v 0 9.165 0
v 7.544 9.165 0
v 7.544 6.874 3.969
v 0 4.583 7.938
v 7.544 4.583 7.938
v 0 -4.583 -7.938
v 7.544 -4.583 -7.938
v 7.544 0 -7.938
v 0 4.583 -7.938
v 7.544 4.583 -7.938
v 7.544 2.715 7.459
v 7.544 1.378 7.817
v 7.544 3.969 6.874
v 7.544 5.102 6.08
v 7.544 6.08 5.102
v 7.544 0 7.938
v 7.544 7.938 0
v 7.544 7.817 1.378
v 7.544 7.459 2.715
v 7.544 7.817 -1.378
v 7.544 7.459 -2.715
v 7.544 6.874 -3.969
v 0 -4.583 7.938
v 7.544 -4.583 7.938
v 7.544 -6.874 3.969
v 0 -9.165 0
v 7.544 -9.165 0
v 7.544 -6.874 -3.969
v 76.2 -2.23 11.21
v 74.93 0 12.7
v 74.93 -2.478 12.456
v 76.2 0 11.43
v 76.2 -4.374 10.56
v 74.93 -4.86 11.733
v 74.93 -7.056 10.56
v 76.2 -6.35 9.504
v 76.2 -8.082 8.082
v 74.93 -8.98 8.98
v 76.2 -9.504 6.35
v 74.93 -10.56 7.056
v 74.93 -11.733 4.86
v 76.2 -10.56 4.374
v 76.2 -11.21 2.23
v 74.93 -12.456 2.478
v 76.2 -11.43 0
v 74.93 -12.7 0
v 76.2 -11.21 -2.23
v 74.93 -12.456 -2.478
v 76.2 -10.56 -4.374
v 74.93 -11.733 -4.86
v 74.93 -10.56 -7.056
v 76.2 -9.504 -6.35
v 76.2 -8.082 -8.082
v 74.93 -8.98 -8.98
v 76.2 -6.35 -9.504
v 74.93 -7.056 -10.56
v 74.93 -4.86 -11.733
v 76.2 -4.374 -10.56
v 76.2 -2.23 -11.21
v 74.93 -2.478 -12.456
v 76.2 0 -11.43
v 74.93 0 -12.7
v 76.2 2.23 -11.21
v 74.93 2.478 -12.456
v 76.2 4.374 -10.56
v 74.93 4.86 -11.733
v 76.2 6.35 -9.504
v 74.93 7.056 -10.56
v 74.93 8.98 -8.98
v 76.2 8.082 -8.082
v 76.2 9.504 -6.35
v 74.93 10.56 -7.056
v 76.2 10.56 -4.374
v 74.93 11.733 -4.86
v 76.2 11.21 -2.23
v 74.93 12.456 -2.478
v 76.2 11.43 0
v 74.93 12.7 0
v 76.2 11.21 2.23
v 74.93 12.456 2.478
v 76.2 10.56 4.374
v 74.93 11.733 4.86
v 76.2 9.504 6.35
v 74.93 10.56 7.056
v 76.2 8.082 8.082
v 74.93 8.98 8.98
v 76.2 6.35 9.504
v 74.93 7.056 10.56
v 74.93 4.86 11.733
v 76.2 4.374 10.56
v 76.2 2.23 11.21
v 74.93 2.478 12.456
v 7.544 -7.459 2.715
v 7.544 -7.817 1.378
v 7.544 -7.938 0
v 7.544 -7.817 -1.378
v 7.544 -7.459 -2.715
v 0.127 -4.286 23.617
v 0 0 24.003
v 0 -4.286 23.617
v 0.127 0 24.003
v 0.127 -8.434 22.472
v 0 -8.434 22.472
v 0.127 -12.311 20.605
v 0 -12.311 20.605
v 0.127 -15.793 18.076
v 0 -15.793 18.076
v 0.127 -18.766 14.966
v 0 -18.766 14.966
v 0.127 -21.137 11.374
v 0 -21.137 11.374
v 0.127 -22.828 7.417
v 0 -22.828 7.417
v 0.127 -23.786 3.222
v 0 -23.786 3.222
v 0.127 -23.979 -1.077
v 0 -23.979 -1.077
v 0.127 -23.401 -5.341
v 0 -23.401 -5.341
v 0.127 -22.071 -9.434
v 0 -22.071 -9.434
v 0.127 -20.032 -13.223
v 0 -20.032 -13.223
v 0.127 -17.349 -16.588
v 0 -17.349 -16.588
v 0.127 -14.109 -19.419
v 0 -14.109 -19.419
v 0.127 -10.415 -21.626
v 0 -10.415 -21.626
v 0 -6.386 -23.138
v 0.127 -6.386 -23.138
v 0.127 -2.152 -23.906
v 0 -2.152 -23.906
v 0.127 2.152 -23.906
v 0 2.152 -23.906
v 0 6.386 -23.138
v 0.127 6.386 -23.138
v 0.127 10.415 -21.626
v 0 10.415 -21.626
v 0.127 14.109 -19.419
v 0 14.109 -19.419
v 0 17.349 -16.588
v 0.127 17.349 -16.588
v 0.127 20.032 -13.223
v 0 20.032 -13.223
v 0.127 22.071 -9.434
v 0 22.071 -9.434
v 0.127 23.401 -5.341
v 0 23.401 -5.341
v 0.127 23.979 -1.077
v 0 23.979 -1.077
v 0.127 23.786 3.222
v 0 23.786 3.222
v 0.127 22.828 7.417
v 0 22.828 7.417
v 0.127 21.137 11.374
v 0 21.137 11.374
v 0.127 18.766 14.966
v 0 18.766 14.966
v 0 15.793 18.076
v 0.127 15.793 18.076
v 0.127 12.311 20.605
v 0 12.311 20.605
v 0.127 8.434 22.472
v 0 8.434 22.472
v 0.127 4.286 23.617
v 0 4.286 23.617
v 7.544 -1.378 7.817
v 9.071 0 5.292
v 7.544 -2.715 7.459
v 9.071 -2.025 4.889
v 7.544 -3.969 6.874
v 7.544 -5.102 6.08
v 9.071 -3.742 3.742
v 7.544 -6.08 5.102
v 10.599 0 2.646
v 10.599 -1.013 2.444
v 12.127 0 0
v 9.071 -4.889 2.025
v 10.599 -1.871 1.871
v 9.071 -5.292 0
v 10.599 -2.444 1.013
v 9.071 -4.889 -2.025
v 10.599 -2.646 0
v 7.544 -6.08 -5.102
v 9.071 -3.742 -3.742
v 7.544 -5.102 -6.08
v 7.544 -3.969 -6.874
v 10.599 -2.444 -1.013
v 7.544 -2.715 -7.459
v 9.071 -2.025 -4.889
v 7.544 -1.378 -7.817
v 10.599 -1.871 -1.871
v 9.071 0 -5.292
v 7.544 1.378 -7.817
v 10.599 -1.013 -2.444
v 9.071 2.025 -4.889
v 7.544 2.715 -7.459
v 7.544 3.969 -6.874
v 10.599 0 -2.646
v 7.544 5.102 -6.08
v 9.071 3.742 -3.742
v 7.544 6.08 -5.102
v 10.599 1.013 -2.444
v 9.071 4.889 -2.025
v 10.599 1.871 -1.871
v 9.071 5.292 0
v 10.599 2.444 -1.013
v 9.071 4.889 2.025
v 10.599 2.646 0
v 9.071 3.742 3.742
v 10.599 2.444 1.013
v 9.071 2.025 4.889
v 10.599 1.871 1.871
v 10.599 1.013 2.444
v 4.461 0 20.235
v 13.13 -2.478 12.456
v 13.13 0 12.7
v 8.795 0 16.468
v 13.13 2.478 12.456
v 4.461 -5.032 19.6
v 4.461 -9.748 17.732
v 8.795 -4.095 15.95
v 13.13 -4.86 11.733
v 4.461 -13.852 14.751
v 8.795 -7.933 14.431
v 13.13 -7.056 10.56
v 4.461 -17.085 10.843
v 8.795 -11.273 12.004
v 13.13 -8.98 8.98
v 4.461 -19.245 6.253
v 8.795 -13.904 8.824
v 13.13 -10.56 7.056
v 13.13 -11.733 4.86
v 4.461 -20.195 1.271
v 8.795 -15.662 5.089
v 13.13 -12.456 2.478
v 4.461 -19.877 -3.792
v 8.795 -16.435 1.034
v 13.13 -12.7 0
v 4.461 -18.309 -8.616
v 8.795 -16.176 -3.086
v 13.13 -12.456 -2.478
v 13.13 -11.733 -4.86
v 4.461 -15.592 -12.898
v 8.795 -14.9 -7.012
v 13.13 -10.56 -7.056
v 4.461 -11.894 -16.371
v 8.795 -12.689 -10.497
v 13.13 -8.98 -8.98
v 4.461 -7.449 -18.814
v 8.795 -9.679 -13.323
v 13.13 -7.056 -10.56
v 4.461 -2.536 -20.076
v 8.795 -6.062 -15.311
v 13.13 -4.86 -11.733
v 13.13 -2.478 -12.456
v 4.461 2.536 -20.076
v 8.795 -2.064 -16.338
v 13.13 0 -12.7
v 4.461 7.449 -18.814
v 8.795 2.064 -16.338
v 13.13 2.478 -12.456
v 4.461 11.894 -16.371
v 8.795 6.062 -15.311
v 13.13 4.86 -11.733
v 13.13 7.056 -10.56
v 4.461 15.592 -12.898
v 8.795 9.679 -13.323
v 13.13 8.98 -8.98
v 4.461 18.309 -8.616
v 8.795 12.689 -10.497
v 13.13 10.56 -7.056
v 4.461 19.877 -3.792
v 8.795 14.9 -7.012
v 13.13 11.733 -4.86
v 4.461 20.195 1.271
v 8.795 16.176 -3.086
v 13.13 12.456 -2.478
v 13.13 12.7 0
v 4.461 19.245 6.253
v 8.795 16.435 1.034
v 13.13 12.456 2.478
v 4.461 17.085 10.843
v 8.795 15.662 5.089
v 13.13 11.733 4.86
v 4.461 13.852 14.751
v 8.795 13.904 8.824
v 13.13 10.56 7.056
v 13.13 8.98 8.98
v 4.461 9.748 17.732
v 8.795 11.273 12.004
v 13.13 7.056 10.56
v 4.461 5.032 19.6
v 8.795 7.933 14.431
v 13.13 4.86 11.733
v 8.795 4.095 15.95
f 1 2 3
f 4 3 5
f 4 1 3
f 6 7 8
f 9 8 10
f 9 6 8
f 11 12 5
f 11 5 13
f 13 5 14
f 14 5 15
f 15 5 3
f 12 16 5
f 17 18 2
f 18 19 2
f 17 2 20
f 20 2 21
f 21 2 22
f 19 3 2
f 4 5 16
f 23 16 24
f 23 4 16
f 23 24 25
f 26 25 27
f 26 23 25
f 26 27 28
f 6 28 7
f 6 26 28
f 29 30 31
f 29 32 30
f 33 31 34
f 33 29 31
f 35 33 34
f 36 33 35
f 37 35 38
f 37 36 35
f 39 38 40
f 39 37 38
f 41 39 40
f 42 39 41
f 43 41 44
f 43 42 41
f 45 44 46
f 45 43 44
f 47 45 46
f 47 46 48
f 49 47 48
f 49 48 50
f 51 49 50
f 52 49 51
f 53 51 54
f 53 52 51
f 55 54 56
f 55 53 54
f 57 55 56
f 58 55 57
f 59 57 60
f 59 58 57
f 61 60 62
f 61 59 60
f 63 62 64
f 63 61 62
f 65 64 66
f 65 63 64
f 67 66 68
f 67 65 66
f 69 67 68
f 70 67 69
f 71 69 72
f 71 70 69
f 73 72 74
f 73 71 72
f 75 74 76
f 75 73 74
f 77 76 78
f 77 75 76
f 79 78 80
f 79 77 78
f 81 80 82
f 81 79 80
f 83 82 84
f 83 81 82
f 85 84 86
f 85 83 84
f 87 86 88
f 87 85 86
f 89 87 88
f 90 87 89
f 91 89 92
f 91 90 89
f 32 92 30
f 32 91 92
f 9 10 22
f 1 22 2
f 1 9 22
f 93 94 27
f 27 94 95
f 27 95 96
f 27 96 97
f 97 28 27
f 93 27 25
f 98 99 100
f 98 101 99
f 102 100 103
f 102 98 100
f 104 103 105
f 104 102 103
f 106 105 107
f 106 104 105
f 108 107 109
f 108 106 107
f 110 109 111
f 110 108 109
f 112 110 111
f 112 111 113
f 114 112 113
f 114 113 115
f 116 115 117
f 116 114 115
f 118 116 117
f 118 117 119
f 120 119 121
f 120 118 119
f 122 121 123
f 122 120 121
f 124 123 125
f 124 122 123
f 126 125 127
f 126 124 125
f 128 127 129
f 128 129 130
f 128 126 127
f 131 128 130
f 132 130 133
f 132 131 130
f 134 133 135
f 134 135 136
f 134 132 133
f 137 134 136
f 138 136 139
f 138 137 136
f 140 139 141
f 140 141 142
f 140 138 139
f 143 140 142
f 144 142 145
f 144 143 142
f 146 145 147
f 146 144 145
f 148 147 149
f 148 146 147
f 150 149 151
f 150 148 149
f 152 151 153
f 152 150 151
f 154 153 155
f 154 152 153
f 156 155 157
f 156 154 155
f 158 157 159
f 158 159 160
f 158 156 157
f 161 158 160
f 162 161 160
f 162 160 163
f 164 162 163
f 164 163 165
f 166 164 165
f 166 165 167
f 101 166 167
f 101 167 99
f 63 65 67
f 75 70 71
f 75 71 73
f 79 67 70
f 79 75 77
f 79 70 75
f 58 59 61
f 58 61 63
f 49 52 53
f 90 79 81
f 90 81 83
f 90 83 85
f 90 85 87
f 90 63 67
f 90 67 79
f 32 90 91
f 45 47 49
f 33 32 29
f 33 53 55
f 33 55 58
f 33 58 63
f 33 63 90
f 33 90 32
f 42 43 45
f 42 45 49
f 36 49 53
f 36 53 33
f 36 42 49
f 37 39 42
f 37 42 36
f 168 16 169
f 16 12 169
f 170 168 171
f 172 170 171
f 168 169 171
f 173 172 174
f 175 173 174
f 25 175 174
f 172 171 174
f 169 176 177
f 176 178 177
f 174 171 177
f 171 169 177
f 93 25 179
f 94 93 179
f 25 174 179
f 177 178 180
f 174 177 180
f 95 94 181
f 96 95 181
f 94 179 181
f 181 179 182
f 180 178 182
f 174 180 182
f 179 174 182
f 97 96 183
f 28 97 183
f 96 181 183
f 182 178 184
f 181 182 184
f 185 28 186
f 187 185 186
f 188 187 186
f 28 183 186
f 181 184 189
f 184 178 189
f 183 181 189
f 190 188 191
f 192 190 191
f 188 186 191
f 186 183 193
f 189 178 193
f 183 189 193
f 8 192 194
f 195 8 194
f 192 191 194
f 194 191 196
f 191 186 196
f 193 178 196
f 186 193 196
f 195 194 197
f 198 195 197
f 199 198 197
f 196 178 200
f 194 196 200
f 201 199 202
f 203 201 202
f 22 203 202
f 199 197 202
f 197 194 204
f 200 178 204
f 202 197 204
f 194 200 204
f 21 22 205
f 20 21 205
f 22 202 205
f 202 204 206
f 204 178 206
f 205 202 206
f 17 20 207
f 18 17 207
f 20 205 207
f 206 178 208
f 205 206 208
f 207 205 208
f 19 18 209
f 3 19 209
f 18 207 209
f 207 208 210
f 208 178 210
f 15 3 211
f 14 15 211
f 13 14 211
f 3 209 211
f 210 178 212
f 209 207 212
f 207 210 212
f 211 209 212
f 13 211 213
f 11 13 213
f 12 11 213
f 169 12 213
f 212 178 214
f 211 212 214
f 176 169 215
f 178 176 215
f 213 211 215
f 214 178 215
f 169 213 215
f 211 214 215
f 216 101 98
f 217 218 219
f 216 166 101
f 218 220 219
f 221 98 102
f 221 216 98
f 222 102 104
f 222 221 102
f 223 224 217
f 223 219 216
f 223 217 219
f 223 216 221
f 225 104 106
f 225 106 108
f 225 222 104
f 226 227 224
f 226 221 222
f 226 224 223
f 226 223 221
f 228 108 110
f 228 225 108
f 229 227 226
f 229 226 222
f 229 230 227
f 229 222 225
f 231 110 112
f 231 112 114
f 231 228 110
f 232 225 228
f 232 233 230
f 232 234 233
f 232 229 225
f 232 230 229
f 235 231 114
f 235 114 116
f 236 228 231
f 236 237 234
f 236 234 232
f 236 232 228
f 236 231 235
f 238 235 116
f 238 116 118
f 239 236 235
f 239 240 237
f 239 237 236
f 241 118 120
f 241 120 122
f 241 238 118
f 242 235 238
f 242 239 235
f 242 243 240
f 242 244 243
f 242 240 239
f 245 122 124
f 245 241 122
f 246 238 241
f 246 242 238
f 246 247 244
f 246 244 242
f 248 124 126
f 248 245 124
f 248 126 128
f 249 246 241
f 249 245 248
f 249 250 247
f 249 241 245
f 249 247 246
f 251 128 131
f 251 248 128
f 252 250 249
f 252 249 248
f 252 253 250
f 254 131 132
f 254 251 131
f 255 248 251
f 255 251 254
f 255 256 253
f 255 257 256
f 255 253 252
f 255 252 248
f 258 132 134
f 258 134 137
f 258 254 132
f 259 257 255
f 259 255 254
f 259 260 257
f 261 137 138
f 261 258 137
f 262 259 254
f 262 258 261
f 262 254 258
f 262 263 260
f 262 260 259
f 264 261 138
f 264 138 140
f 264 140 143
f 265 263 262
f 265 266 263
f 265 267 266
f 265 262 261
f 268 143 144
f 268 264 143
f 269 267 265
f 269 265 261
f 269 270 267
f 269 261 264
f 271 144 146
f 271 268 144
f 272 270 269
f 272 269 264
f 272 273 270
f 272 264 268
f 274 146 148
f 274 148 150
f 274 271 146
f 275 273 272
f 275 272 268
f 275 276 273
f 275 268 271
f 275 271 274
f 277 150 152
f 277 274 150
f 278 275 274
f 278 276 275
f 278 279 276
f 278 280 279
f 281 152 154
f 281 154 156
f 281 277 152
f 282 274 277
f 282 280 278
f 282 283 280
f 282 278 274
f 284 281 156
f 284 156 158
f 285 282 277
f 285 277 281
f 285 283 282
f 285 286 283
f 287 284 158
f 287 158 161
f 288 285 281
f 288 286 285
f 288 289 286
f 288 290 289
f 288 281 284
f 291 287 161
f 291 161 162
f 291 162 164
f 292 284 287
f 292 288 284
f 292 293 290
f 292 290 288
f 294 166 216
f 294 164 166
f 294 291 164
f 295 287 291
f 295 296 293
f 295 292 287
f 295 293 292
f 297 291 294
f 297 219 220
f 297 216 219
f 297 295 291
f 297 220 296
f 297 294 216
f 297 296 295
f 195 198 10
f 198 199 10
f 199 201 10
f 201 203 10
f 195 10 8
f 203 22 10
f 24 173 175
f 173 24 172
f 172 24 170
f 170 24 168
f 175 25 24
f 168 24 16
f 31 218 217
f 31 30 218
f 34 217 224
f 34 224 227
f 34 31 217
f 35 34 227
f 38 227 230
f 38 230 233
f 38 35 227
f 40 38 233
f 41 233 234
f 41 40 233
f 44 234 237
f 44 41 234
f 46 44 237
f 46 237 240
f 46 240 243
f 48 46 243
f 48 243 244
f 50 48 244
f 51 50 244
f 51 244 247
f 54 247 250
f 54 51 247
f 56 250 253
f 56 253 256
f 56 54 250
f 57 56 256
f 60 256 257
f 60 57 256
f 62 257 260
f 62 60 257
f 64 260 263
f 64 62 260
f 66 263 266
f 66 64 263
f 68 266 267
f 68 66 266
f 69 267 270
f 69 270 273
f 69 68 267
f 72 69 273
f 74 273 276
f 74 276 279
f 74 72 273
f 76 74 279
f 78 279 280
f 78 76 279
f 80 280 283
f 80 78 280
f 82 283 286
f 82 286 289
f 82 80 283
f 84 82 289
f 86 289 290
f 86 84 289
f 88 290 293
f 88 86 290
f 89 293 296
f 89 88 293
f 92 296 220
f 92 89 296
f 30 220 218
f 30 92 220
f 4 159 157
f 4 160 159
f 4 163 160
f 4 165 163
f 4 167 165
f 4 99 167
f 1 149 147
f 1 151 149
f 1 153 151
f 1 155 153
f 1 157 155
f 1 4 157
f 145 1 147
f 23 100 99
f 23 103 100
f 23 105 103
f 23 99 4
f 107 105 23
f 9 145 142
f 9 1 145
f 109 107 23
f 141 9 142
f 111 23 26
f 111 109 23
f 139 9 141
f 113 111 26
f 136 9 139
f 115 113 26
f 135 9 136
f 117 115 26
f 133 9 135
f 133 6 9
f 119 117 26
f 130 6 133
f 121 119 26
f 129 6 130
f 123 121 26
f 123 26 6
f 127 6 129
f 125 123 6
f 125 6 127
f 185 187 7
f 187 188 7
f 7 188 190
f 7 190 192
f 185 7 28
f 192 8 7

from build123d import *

# Parameters (mm, degrees)
HEX_2_DEPTH = 7.5438


with BuildPart() as part:
    # BodySke → BaseBody (revolve)
    with BuildSketch(Plane.XY, mode=Mode.PRIVATE) as basebody_sk:
        Polygon((0, 0), (0, 24.003), (0.127, 24.003), (13.129614107, 12.7), (74.93, 12.7), (76.2, 11.43), (76.2, 0), align=None)
    revolve(basebody_sk.sketch.rotate(Axis((0, 0, 0), (1, 0, 0)), 90), axis=Axis((0, 0, 0), (1, 0, 0)))  # turned: the seam where the file's is

    # Sketch2 → PreBroach (revolve, cut)
    with BuildSketch(Plane.XY, mode=Mode.PRIVATE) as prebroach_sk:
        Polygon((0, 7.9375), (7.5438, 7.9375), (12.126517762, 0), (0, 0), align=None)
    revolve(prebroach_sk.sketch.rotate(Axis((0, 0, 0), (1, 0, 0)), 90), axis=Axis((0, 0, 0), (1, 0, 0)), mode=Mode.SUBTRACT)  # turned: the seam where the file's is

    # Sketch3 → Hex 2 (cut)
    with BuildSketch(Plane.ZY):
        Polygon((-7.9375, -4.582717762), (-7.9375, 4.582717762), (0, 9.165435523), (7.9375, 4.582717762), (7.9375, -4.582717762), (0, -9.165435523), align=None)
    extrude(amount=-HEX_2_DEPTH, mode=Mode.SUBTRACT)


solid = part.part
